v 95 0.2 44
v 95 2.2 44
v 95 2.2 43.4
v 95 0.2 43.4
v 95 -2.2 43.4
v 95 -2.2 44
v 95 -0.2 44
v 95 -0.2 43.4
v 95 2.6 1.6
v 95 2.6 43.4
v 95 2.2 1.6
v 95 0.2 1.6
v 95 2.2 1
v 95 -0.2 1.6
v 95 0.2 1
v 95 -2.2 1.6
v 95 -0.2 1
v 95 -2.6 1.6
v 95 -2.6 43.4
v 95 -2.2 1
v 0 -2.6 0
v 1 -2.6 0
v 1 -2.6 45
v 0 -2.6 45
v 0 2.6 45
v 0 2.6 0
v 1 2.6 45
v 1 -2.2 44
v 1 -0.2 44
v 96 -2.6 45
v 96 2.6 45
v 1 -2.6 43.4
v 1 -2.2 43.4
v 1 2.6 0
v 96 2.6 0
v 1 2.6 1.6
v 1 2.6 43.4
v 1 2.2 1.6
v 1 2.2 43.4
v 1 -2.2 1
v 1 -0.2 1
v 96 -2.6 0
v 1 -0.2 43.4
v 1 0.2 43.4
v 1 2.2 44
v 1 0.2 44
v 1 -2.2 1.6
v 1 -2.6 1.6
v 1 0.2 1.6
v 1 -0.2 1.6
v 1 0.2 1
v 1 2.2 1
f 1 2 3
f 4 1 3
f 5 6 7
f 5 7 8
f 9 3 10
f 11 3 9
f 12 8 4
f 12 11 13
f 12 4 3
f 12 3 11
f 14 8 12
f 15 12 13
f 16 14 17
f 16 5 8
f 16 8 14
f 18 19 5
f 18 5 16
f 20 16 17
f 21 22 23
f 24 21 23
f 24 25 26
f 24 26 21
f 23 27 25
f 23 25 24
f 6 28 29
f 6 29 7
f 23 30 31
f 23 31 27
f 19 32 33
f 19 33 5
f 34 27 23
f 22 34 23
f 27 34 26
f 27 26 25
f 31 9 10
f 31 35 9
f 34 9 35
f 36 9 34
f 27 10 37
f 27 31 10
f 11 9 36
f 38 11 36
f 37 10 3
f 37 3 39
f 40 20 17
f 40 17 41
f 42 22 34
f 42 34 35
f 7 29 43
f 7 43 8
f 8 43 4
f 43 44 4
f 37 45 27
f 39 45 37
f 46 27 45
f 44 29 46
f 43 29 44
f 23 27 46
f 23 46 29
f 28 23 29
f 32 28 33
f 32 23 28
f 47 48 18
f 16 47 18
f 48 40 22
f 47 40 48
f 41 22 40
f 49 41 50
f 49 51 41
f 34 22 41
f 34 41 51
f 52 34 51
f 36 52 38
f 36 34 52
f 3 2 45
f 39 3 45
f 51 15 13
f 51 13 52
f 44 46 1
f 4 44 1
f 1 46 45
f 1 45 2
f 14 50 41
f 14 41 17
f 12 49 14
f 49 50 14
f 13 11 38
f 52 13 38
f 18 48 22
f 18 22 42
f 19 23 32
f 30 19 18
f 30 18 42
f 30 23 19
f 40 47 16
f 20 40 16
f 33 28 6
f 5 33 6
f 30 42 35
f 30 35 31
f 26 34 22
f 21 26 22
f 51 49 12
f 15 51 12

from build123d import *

# Parameters (mm, degrees)
F1_DEPTH = 2.6
F2_W     = 94
F2_H     = 0.6
F3_DEPTH = 0.2
F4_W     = 94
F4_H     = 0.6
F5_DEPTH = 0.4
F6_W     = 94
F6_H     = 0.6
F7_DEPTH = 0.4
F8_W     = 5.2
F8_H     = 45
F9_DEPTH = 1


with BuildPart() as f1:
    # F0 (on Front) → F1 (new body, symmetric)
    with BuildSketch(Plane.XZ):
        Polygon((1, 1), (1, 0), (96, 0), (96, 45), (1, 45), (1, 44), (95, 44), (95, 1), align=None)
    extrude(amount=F1_DEPTH, both=True)

    # F2 (on Front) → F3 (join, symmetric)
    with BuildSketch(Plane.XZ):
        with Locations((48, 43.7)):
            Rectangle(F2_W, F2_H)
        with Locations((48, 1.3)):
            Rectangle(F2_W, F2_H)
    extrude(amount=F3_DEPTH, both=True)

    # F4 (on face) → F5 (join)
    with BuildSketch(Plane.XZ.offset(2.6)):
        with Locations((48, 1.3)):
            Rectangle(F4_W, F4_H)
        with Locations((48, 43.7)):
            Rectangle(F4_W, F4_H)
    extrude(amount=-F5_DEPTH)

    # F6 (on face) → F7 (join)
    with BuildSketch(Plane(origin=(0, 2.6, 0), x_dir=(-1, 0, 0), z_dir=(0, 1, 0))):
        with Locations((-48, 1.3)):
            Rectangle(F6_W, F6_H)
        with Locations((-48, 43.7)):
            Rectangle(F6_W, F6_H)
    extrude(amount=-F7_DEPTH)


with BuildPart() as f9:
    # F8 (on face) → F9 (new body)
    with BuildSketch(Plane(origin=(1, 0, 0), x_dir=(0, -1, 0), z_dir=(-1, 0, 0))):
        with Locations((0, 22.5)):
            Rectangle(F8_W, F8_H)
    extrude(amount=F9_DEPTH)


solid = Compound([f1.part, f9.part])
